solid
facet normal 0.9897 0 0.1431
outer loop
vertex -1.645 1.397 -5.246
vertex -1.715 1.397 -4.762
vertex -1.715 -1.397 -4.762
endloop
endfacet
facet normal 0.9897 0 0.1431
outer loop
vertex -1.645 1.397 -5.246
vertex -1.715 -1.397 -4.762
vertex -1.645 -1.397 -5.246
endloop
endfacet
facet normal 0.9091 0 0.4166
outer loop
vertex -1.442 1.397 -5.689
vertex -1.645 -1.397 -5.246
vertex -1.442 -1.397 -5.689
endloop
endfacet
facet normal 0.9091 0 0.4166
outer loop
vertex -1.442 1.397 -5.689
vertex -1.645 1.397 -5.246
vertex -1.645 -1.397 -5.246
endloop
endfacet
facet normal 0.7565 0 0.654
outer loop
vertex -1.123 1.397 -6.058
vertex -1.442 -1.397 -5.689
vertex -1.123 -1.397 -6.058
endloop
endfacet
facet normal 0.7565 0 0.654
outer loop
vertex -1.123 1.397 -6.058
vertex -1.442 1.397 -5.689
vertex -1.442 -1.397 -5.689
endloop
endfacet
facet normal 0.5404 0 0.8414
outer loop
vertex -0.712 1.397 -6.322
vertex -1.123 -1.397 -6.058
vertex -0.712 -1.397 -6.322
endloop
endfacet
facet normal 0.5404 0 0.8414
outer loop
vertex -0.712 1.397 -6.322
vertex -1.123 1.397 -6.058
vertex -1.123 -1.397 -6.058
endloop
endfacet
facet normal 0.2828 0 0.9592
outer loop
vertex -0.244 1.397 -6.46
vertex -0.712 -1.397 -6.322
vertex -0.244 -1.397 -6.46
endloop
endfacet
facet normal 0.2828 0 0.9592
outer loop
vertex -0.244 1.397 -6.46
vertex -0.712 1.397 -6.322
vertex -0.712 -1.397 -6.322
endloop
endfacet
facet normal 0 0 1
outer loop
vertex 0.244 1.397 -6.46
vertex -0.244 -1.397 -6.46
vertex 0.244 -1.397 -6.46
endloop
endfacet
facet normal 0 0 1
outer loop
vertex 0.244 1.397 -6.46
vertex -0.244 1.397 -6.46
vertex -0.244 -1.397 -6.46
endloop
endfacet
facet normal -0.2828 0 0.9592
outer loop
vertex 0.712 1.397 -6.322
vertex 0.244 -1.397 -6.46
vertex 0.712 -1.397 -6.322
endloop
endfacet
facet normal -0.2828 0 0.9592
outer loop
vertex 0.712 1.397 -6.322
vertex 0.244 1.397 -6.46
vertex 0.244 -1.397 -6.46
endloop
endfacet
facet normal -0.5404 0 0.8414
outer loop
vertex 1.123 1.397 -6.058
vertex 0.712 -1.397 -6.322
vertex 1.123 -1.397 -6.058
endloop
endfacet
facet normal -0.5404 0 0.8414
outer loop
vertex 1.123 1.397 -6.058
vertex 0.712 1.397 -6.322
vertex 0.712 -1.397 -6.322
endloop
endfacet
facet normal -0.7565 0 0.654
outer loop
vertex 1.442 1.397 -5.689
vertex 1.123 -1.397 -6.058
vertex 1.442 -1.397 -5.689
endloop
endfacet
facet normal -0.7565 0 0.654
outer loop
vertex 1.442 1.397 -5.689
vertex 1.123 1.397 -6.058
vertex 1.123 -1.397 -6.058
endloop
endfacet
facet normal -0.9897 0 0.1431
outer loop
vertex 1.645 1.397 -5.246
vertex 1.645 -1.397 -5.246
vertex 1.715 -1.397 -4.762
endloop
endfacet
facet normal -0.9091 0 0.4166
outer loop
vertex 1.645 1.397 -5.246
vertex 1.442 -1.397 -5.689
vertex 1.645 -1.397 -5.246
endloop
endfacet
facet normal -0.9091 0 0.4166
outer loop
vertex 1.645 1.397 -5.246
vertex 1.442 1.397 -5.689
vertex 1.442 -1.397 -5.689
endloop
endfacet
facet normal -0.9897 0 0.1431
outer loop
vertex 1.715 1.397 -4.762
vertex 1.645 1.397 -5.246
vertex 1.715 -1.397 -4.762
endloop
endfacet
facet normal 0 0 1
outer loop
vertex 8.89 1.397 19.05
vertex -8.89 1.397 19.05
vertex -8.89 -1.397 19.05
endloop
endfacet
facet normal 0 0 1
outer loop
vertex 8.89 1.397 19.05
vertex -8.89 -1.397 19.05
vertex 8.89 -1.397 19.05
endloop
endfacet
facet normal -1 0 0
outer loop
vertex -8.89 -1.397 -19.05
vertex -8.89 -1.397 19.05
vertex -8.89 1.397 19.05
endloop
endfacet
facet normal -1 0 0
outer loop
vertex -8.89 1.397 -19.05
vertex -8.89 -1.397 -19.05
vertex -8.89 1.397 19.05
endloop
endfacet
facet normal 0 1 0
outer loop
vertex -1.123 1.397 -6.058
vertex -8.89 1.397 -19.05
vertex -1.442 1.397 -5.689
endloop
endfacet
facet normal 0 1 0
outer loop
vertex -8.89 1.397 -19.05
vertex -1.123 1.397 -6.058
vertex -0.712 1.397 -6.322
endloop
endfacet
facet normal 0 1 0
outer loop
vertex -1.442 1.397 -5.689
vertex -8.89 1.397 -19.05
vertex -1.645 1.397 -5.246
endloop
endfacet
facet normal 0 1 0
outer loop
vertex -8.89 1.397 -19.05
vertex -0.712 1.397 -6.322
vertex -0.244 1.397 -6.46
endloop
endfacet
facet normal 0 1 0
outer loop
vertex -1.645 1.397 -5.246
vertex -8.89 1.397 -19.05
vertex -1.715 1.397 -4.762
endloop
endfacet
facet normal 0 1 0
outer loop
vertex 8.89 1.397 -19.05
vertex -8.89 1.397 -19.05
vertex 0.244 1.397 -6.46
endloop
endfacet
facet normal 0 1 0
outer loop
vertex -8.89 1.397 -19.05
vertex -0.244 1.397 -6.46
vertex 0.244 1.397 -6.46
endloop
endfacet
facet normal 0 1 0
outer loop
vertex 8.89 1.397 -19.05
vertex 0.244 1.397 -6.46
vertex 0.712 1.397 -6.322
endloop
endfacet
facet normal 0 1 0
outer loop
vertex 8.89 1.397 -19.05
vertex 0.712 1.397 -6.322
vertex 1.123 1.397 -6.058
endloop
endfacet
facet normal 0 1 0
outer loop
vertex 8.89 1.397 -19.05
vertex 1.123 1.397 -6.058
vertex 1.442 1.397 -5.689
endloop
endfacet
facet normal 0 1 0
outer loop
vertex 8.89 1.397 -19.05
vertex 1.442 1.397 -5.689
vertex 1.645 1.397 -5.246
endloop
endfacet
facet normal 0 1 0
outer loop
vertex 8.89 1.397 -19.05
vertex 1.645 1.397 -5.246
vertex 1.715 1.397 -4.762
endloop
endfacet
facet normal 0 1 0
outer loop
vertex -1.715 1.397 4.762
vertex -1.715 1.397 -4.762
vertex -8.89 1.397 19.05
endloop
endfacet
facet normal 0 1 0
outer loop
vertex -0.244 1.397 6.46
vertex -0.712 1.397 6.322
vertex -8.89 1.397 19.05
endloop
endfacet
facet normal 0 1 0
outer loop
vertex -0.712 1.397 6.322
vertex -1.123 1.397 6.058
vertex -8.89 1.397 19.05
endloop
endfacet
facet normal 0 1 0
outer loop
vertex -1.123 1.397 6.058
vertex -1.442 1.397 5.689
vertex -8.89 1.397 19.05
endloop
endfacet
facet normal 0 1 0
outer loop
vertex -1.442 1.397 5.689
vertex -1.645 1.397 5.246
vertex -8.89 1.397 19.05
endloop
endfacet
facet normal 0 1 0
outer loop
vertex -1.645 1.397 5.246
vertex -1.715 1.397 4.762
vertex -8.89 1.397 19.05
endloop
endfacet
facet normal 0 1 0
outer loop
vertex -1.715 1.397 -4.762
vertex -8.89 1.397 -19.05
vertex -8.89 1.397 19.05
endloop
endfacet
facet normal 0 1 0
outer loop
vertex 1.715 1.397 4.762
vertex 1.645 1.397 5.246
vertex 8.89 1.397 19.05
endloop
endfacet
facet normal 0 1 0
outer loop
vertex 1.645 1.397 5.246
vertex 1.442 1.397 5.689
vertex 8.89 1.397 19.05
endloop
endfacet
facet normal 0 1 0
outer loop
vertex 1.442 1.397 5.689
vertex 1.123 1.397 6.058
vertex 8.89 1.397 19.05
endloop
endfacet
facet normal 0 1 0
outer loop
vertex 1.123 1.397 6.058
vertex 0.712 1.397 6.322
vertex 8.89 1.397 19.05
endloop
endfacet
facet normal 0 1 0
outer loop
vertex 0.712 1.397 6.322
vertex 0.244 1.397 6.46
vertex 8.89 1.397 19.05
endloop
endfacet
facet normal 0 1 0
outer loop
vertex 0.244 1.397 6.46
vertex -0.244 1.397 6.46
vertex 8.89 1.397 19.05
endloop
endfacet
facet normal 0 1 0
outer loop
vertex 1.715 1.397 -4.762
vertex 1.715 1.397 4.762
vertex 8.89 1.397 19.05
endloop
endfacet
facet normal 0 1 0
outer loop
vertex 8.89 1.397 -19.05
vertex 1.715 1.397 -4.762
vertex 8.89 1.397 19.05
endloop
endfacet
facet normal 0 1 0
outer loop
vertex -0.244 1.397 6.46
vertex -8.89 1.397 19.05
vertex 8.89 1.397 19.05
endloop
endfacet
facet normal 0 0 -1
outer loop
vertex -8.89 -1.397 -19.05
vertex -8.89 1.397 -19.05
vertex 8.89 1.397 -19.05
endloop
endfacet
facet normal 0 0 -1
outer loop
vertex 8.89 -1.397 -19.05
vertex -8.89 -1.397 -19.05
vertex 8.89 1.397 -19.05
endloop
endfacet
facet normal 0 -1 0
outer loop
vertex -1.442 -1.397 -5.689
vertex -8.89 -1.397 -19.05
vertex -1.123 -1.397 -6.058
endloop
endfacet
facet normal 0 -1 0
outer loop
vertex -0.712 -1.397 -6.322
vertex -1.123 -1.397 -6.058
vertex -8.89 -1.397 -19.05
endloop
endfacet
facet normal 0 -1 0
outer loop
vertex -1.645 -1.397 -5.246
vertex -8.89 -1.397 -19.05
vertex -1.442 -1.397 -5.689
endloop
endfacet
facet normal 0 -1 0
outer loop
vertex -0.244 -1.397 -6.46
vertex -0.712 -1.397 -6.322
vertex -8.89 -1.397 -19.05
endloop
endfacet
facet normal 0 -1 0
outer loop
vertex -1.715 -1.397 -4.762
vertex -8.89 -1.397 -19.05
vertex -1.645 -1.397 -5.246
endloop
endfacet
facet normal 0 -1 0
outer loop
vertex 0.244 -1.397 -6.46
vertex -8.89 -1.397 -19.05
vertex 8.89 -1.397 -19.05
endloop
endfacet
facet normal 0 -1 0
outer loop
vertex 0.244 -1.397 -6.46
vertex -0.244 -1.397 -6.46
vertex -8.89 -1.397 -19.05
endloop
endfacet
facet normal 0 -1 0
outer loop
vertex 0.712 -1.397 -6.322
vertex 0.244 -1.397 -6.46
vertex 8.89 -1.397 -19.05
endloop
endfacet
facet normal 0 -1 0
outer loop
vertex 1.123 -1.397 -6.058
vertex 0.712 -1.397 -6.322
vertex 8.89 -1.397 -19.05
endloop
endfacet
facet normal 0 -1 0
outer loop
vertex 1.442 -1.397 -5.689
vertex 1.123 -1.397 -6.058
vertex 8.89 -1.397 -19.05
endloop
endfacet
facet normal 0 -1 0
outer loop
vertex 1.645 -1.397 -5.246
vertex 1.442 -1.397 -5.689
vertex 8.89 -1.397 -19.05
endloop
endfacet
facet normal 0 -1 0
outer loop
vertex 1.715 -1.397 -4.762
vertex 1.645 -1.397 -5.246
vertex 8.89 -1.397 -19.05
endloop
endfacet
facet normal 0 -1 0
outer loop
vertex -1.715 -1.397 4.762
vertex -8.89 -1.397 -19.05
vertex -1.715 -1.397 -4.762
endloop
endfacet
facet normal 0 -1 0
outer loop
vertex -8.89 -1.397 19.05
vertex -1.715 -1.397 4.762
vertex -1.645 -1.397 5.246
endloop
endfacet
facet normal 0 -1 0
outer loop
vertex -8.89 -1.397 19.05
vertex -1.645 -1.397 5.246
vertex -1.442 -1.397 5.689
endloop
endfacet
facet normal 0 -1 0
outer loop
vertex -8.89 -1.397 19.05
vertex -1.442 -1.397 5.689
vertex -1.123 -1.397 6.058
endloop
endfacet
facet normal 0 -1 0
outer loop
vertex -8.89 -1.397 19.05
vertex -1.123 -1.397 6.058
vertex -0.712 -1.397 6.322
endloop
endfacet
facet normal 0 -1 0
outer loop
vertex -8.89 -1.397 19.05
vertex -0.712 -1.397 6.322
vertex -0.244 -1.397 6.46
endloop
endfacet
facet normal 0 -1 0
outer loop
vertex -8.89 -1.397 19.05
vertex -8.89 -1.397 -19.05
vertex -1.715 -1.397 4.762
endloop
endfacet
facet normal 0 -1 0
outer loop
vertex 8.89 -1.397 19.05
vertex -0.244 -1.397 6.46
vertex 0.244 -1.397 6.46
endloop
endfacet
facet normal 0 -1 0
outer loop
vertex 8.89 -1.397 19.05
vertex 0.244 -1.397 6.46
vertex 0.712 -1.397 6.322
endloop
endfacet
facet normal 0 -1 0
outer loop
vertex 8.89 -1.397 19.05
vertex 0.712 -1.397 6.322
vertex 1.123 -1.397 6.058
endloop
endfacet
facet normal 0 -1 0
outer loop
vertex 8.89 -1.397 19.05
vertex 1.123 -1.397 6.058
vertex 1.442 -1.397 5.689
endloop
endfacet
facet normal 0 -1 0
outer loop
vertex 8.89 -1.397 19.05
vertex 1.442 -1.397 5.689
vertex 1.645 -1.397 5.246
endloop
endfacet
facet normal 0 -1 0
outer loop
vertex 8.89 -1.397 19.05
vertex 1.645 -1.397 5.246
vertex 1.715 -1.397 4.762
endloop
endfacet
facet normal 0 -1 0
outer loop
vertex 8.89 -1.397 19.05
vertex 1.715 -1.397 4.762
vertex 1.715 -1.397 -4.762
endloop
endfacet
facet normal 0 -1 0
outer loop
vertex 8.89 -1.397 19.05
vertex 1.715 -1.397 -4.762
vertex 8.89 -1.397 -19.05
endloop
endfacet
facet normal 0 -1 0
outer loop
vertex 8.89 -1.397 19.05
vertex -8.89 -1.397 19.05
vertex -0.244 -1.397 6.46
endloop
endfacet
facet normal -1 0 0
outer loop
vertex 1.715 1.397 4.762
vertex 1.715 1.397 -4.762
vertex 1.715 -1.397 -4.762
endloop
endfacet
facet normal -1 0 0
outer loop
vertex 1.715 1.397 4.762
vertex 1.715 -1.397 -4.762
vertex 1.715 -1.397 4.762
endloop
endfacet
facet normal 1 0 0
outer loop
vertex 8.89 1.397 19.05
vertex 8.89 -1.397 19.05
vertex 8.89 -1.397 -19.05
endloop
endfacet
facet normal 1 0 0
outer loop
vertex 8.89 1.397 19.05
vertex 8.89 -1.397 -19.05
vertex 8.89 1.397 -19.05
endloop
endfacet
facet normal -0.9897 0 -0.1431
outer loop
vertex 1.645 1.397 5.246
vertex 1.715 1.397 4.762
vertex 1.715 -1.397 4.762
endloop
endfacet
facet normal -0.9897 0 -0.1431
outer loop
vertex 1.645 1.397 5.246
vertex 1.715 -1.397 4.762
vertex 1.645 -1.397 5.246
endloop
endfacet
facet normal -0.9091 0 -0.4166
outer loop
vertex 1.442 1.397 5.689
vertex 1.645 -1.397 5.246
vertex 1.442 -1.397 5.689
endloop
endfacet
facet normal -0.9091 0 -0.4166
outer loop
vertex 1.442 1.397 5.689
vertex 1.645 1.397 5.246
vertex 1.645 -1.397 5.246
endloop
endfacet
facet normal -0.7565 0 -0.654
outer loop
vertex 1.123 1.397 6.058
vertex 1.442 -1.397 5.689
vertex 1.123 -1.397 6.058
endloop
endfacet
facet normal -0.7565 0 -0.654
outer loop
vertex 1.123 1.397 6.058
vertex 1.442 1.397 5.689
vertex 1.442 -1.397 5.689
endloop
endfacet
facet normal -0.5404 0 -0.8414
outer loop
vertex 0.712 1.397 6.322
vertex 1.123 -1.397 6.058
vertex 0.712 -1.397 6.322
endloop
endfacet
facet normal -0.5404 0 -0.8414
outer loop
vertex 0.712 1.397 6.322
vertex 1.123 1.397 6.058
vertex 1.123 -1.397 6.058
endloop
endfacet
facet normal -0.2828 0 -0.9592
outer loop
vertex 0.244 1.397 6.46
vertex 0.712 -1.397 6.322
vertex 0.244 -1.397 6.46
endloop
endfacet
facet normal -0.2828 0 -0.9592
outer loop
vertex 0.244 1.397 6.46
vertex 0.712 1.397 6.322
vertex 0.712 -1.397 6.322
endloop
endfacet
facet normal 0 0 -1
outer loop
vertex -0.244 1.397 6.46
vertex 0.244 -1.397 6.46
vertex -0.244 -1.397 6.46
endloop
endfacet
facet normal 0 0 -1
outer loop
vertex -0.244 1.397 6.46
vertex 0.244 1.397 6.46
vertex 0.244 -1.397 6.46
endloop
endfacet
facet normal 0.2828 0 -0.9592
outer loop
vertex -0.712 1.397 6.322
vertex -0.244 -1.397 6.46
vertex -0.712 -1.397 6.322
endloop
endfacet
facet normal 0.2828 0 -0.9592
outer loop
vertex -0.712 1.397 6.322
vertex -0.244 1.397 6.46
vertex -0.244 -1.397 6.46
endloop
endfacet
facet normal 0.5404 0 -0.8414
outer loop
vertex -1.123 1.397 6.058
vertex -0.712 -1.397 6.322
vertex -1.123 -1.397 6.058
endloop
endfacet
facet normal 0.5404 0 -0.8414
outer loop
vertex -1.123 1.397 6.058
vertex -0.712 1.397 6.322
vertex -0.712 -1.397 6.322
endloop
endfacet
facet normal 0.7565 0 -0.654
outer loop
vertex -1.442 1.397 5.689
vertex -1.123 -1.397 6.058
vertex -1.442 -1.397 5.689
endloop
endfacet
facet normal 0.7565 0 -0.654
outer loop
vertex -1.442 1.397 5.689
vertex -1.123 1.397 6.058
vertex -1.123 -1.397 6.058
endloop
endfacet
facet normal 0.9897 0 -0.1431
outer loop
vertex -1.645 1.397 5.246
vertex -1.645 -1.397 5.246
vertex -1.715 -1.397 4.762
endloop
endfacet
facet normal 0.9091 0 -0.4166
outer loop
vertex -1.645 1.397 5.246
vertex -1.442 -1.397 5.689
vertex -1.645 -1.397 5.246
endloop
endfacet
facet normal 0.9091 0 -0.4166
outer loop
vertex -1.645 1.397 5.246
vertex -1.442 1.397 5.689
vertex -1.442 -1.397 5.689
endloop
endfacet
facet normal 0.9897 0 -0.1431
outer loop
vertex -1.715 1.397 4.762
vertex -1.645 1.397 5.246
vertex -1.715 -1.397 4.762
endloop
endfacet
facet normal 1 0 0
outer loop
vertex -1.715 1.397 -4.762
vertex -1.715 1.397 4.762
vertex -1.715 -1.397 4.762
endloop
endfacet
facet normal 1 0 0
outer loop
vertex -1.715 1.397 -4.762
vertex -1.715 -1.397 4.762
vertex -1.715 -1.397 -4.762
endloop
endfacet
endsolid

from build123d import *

# Parameters (mm, degrees)
SKETCH1_W           = 17.78
SKETCH1_H           = 2.794
BOSS_EXTRUDE1_DEPTH = 19.05
CUT_EXTRUDE1_DEPTH  = 22.207098717


with BuildPart() as part:
    # Sketch1 → Boss-Extrude1 (new, symmetric)
    with BuildSketch(Plane.XY):
        Rectangle(SKETCH1_W, SKETCH1_H)
    extrude(amount=BOSS_EXTRUDE1_DEPTH, both=True)

    # Sketch2 → Cut-Extrude1 (cut, through all)
    with BuildSketch(Plane(origin=(0, 1.397, 0), x_dir=(1, 0, 0), z_dir=(0, 1, 0))):
        with BuildLine():
            Line((-1.7145, -4.7625), (-1.7145, 4.7625))
            ThreePointArc((-1.7145, 4.7625), (0, 6.477), (1.7145, 4.7625))
            Line((1.7145, 4.7625), (1.7145, -4.7625))
            ThreePointArc((1.7145, -4.7625), (0, -6.477), (-1.7145, -4.7625))
        make_face()
    extrude(amount=-CUT_EXTRUDE1_DEPTH, mode=Mode.SUBTRACT)


solid = part.part
